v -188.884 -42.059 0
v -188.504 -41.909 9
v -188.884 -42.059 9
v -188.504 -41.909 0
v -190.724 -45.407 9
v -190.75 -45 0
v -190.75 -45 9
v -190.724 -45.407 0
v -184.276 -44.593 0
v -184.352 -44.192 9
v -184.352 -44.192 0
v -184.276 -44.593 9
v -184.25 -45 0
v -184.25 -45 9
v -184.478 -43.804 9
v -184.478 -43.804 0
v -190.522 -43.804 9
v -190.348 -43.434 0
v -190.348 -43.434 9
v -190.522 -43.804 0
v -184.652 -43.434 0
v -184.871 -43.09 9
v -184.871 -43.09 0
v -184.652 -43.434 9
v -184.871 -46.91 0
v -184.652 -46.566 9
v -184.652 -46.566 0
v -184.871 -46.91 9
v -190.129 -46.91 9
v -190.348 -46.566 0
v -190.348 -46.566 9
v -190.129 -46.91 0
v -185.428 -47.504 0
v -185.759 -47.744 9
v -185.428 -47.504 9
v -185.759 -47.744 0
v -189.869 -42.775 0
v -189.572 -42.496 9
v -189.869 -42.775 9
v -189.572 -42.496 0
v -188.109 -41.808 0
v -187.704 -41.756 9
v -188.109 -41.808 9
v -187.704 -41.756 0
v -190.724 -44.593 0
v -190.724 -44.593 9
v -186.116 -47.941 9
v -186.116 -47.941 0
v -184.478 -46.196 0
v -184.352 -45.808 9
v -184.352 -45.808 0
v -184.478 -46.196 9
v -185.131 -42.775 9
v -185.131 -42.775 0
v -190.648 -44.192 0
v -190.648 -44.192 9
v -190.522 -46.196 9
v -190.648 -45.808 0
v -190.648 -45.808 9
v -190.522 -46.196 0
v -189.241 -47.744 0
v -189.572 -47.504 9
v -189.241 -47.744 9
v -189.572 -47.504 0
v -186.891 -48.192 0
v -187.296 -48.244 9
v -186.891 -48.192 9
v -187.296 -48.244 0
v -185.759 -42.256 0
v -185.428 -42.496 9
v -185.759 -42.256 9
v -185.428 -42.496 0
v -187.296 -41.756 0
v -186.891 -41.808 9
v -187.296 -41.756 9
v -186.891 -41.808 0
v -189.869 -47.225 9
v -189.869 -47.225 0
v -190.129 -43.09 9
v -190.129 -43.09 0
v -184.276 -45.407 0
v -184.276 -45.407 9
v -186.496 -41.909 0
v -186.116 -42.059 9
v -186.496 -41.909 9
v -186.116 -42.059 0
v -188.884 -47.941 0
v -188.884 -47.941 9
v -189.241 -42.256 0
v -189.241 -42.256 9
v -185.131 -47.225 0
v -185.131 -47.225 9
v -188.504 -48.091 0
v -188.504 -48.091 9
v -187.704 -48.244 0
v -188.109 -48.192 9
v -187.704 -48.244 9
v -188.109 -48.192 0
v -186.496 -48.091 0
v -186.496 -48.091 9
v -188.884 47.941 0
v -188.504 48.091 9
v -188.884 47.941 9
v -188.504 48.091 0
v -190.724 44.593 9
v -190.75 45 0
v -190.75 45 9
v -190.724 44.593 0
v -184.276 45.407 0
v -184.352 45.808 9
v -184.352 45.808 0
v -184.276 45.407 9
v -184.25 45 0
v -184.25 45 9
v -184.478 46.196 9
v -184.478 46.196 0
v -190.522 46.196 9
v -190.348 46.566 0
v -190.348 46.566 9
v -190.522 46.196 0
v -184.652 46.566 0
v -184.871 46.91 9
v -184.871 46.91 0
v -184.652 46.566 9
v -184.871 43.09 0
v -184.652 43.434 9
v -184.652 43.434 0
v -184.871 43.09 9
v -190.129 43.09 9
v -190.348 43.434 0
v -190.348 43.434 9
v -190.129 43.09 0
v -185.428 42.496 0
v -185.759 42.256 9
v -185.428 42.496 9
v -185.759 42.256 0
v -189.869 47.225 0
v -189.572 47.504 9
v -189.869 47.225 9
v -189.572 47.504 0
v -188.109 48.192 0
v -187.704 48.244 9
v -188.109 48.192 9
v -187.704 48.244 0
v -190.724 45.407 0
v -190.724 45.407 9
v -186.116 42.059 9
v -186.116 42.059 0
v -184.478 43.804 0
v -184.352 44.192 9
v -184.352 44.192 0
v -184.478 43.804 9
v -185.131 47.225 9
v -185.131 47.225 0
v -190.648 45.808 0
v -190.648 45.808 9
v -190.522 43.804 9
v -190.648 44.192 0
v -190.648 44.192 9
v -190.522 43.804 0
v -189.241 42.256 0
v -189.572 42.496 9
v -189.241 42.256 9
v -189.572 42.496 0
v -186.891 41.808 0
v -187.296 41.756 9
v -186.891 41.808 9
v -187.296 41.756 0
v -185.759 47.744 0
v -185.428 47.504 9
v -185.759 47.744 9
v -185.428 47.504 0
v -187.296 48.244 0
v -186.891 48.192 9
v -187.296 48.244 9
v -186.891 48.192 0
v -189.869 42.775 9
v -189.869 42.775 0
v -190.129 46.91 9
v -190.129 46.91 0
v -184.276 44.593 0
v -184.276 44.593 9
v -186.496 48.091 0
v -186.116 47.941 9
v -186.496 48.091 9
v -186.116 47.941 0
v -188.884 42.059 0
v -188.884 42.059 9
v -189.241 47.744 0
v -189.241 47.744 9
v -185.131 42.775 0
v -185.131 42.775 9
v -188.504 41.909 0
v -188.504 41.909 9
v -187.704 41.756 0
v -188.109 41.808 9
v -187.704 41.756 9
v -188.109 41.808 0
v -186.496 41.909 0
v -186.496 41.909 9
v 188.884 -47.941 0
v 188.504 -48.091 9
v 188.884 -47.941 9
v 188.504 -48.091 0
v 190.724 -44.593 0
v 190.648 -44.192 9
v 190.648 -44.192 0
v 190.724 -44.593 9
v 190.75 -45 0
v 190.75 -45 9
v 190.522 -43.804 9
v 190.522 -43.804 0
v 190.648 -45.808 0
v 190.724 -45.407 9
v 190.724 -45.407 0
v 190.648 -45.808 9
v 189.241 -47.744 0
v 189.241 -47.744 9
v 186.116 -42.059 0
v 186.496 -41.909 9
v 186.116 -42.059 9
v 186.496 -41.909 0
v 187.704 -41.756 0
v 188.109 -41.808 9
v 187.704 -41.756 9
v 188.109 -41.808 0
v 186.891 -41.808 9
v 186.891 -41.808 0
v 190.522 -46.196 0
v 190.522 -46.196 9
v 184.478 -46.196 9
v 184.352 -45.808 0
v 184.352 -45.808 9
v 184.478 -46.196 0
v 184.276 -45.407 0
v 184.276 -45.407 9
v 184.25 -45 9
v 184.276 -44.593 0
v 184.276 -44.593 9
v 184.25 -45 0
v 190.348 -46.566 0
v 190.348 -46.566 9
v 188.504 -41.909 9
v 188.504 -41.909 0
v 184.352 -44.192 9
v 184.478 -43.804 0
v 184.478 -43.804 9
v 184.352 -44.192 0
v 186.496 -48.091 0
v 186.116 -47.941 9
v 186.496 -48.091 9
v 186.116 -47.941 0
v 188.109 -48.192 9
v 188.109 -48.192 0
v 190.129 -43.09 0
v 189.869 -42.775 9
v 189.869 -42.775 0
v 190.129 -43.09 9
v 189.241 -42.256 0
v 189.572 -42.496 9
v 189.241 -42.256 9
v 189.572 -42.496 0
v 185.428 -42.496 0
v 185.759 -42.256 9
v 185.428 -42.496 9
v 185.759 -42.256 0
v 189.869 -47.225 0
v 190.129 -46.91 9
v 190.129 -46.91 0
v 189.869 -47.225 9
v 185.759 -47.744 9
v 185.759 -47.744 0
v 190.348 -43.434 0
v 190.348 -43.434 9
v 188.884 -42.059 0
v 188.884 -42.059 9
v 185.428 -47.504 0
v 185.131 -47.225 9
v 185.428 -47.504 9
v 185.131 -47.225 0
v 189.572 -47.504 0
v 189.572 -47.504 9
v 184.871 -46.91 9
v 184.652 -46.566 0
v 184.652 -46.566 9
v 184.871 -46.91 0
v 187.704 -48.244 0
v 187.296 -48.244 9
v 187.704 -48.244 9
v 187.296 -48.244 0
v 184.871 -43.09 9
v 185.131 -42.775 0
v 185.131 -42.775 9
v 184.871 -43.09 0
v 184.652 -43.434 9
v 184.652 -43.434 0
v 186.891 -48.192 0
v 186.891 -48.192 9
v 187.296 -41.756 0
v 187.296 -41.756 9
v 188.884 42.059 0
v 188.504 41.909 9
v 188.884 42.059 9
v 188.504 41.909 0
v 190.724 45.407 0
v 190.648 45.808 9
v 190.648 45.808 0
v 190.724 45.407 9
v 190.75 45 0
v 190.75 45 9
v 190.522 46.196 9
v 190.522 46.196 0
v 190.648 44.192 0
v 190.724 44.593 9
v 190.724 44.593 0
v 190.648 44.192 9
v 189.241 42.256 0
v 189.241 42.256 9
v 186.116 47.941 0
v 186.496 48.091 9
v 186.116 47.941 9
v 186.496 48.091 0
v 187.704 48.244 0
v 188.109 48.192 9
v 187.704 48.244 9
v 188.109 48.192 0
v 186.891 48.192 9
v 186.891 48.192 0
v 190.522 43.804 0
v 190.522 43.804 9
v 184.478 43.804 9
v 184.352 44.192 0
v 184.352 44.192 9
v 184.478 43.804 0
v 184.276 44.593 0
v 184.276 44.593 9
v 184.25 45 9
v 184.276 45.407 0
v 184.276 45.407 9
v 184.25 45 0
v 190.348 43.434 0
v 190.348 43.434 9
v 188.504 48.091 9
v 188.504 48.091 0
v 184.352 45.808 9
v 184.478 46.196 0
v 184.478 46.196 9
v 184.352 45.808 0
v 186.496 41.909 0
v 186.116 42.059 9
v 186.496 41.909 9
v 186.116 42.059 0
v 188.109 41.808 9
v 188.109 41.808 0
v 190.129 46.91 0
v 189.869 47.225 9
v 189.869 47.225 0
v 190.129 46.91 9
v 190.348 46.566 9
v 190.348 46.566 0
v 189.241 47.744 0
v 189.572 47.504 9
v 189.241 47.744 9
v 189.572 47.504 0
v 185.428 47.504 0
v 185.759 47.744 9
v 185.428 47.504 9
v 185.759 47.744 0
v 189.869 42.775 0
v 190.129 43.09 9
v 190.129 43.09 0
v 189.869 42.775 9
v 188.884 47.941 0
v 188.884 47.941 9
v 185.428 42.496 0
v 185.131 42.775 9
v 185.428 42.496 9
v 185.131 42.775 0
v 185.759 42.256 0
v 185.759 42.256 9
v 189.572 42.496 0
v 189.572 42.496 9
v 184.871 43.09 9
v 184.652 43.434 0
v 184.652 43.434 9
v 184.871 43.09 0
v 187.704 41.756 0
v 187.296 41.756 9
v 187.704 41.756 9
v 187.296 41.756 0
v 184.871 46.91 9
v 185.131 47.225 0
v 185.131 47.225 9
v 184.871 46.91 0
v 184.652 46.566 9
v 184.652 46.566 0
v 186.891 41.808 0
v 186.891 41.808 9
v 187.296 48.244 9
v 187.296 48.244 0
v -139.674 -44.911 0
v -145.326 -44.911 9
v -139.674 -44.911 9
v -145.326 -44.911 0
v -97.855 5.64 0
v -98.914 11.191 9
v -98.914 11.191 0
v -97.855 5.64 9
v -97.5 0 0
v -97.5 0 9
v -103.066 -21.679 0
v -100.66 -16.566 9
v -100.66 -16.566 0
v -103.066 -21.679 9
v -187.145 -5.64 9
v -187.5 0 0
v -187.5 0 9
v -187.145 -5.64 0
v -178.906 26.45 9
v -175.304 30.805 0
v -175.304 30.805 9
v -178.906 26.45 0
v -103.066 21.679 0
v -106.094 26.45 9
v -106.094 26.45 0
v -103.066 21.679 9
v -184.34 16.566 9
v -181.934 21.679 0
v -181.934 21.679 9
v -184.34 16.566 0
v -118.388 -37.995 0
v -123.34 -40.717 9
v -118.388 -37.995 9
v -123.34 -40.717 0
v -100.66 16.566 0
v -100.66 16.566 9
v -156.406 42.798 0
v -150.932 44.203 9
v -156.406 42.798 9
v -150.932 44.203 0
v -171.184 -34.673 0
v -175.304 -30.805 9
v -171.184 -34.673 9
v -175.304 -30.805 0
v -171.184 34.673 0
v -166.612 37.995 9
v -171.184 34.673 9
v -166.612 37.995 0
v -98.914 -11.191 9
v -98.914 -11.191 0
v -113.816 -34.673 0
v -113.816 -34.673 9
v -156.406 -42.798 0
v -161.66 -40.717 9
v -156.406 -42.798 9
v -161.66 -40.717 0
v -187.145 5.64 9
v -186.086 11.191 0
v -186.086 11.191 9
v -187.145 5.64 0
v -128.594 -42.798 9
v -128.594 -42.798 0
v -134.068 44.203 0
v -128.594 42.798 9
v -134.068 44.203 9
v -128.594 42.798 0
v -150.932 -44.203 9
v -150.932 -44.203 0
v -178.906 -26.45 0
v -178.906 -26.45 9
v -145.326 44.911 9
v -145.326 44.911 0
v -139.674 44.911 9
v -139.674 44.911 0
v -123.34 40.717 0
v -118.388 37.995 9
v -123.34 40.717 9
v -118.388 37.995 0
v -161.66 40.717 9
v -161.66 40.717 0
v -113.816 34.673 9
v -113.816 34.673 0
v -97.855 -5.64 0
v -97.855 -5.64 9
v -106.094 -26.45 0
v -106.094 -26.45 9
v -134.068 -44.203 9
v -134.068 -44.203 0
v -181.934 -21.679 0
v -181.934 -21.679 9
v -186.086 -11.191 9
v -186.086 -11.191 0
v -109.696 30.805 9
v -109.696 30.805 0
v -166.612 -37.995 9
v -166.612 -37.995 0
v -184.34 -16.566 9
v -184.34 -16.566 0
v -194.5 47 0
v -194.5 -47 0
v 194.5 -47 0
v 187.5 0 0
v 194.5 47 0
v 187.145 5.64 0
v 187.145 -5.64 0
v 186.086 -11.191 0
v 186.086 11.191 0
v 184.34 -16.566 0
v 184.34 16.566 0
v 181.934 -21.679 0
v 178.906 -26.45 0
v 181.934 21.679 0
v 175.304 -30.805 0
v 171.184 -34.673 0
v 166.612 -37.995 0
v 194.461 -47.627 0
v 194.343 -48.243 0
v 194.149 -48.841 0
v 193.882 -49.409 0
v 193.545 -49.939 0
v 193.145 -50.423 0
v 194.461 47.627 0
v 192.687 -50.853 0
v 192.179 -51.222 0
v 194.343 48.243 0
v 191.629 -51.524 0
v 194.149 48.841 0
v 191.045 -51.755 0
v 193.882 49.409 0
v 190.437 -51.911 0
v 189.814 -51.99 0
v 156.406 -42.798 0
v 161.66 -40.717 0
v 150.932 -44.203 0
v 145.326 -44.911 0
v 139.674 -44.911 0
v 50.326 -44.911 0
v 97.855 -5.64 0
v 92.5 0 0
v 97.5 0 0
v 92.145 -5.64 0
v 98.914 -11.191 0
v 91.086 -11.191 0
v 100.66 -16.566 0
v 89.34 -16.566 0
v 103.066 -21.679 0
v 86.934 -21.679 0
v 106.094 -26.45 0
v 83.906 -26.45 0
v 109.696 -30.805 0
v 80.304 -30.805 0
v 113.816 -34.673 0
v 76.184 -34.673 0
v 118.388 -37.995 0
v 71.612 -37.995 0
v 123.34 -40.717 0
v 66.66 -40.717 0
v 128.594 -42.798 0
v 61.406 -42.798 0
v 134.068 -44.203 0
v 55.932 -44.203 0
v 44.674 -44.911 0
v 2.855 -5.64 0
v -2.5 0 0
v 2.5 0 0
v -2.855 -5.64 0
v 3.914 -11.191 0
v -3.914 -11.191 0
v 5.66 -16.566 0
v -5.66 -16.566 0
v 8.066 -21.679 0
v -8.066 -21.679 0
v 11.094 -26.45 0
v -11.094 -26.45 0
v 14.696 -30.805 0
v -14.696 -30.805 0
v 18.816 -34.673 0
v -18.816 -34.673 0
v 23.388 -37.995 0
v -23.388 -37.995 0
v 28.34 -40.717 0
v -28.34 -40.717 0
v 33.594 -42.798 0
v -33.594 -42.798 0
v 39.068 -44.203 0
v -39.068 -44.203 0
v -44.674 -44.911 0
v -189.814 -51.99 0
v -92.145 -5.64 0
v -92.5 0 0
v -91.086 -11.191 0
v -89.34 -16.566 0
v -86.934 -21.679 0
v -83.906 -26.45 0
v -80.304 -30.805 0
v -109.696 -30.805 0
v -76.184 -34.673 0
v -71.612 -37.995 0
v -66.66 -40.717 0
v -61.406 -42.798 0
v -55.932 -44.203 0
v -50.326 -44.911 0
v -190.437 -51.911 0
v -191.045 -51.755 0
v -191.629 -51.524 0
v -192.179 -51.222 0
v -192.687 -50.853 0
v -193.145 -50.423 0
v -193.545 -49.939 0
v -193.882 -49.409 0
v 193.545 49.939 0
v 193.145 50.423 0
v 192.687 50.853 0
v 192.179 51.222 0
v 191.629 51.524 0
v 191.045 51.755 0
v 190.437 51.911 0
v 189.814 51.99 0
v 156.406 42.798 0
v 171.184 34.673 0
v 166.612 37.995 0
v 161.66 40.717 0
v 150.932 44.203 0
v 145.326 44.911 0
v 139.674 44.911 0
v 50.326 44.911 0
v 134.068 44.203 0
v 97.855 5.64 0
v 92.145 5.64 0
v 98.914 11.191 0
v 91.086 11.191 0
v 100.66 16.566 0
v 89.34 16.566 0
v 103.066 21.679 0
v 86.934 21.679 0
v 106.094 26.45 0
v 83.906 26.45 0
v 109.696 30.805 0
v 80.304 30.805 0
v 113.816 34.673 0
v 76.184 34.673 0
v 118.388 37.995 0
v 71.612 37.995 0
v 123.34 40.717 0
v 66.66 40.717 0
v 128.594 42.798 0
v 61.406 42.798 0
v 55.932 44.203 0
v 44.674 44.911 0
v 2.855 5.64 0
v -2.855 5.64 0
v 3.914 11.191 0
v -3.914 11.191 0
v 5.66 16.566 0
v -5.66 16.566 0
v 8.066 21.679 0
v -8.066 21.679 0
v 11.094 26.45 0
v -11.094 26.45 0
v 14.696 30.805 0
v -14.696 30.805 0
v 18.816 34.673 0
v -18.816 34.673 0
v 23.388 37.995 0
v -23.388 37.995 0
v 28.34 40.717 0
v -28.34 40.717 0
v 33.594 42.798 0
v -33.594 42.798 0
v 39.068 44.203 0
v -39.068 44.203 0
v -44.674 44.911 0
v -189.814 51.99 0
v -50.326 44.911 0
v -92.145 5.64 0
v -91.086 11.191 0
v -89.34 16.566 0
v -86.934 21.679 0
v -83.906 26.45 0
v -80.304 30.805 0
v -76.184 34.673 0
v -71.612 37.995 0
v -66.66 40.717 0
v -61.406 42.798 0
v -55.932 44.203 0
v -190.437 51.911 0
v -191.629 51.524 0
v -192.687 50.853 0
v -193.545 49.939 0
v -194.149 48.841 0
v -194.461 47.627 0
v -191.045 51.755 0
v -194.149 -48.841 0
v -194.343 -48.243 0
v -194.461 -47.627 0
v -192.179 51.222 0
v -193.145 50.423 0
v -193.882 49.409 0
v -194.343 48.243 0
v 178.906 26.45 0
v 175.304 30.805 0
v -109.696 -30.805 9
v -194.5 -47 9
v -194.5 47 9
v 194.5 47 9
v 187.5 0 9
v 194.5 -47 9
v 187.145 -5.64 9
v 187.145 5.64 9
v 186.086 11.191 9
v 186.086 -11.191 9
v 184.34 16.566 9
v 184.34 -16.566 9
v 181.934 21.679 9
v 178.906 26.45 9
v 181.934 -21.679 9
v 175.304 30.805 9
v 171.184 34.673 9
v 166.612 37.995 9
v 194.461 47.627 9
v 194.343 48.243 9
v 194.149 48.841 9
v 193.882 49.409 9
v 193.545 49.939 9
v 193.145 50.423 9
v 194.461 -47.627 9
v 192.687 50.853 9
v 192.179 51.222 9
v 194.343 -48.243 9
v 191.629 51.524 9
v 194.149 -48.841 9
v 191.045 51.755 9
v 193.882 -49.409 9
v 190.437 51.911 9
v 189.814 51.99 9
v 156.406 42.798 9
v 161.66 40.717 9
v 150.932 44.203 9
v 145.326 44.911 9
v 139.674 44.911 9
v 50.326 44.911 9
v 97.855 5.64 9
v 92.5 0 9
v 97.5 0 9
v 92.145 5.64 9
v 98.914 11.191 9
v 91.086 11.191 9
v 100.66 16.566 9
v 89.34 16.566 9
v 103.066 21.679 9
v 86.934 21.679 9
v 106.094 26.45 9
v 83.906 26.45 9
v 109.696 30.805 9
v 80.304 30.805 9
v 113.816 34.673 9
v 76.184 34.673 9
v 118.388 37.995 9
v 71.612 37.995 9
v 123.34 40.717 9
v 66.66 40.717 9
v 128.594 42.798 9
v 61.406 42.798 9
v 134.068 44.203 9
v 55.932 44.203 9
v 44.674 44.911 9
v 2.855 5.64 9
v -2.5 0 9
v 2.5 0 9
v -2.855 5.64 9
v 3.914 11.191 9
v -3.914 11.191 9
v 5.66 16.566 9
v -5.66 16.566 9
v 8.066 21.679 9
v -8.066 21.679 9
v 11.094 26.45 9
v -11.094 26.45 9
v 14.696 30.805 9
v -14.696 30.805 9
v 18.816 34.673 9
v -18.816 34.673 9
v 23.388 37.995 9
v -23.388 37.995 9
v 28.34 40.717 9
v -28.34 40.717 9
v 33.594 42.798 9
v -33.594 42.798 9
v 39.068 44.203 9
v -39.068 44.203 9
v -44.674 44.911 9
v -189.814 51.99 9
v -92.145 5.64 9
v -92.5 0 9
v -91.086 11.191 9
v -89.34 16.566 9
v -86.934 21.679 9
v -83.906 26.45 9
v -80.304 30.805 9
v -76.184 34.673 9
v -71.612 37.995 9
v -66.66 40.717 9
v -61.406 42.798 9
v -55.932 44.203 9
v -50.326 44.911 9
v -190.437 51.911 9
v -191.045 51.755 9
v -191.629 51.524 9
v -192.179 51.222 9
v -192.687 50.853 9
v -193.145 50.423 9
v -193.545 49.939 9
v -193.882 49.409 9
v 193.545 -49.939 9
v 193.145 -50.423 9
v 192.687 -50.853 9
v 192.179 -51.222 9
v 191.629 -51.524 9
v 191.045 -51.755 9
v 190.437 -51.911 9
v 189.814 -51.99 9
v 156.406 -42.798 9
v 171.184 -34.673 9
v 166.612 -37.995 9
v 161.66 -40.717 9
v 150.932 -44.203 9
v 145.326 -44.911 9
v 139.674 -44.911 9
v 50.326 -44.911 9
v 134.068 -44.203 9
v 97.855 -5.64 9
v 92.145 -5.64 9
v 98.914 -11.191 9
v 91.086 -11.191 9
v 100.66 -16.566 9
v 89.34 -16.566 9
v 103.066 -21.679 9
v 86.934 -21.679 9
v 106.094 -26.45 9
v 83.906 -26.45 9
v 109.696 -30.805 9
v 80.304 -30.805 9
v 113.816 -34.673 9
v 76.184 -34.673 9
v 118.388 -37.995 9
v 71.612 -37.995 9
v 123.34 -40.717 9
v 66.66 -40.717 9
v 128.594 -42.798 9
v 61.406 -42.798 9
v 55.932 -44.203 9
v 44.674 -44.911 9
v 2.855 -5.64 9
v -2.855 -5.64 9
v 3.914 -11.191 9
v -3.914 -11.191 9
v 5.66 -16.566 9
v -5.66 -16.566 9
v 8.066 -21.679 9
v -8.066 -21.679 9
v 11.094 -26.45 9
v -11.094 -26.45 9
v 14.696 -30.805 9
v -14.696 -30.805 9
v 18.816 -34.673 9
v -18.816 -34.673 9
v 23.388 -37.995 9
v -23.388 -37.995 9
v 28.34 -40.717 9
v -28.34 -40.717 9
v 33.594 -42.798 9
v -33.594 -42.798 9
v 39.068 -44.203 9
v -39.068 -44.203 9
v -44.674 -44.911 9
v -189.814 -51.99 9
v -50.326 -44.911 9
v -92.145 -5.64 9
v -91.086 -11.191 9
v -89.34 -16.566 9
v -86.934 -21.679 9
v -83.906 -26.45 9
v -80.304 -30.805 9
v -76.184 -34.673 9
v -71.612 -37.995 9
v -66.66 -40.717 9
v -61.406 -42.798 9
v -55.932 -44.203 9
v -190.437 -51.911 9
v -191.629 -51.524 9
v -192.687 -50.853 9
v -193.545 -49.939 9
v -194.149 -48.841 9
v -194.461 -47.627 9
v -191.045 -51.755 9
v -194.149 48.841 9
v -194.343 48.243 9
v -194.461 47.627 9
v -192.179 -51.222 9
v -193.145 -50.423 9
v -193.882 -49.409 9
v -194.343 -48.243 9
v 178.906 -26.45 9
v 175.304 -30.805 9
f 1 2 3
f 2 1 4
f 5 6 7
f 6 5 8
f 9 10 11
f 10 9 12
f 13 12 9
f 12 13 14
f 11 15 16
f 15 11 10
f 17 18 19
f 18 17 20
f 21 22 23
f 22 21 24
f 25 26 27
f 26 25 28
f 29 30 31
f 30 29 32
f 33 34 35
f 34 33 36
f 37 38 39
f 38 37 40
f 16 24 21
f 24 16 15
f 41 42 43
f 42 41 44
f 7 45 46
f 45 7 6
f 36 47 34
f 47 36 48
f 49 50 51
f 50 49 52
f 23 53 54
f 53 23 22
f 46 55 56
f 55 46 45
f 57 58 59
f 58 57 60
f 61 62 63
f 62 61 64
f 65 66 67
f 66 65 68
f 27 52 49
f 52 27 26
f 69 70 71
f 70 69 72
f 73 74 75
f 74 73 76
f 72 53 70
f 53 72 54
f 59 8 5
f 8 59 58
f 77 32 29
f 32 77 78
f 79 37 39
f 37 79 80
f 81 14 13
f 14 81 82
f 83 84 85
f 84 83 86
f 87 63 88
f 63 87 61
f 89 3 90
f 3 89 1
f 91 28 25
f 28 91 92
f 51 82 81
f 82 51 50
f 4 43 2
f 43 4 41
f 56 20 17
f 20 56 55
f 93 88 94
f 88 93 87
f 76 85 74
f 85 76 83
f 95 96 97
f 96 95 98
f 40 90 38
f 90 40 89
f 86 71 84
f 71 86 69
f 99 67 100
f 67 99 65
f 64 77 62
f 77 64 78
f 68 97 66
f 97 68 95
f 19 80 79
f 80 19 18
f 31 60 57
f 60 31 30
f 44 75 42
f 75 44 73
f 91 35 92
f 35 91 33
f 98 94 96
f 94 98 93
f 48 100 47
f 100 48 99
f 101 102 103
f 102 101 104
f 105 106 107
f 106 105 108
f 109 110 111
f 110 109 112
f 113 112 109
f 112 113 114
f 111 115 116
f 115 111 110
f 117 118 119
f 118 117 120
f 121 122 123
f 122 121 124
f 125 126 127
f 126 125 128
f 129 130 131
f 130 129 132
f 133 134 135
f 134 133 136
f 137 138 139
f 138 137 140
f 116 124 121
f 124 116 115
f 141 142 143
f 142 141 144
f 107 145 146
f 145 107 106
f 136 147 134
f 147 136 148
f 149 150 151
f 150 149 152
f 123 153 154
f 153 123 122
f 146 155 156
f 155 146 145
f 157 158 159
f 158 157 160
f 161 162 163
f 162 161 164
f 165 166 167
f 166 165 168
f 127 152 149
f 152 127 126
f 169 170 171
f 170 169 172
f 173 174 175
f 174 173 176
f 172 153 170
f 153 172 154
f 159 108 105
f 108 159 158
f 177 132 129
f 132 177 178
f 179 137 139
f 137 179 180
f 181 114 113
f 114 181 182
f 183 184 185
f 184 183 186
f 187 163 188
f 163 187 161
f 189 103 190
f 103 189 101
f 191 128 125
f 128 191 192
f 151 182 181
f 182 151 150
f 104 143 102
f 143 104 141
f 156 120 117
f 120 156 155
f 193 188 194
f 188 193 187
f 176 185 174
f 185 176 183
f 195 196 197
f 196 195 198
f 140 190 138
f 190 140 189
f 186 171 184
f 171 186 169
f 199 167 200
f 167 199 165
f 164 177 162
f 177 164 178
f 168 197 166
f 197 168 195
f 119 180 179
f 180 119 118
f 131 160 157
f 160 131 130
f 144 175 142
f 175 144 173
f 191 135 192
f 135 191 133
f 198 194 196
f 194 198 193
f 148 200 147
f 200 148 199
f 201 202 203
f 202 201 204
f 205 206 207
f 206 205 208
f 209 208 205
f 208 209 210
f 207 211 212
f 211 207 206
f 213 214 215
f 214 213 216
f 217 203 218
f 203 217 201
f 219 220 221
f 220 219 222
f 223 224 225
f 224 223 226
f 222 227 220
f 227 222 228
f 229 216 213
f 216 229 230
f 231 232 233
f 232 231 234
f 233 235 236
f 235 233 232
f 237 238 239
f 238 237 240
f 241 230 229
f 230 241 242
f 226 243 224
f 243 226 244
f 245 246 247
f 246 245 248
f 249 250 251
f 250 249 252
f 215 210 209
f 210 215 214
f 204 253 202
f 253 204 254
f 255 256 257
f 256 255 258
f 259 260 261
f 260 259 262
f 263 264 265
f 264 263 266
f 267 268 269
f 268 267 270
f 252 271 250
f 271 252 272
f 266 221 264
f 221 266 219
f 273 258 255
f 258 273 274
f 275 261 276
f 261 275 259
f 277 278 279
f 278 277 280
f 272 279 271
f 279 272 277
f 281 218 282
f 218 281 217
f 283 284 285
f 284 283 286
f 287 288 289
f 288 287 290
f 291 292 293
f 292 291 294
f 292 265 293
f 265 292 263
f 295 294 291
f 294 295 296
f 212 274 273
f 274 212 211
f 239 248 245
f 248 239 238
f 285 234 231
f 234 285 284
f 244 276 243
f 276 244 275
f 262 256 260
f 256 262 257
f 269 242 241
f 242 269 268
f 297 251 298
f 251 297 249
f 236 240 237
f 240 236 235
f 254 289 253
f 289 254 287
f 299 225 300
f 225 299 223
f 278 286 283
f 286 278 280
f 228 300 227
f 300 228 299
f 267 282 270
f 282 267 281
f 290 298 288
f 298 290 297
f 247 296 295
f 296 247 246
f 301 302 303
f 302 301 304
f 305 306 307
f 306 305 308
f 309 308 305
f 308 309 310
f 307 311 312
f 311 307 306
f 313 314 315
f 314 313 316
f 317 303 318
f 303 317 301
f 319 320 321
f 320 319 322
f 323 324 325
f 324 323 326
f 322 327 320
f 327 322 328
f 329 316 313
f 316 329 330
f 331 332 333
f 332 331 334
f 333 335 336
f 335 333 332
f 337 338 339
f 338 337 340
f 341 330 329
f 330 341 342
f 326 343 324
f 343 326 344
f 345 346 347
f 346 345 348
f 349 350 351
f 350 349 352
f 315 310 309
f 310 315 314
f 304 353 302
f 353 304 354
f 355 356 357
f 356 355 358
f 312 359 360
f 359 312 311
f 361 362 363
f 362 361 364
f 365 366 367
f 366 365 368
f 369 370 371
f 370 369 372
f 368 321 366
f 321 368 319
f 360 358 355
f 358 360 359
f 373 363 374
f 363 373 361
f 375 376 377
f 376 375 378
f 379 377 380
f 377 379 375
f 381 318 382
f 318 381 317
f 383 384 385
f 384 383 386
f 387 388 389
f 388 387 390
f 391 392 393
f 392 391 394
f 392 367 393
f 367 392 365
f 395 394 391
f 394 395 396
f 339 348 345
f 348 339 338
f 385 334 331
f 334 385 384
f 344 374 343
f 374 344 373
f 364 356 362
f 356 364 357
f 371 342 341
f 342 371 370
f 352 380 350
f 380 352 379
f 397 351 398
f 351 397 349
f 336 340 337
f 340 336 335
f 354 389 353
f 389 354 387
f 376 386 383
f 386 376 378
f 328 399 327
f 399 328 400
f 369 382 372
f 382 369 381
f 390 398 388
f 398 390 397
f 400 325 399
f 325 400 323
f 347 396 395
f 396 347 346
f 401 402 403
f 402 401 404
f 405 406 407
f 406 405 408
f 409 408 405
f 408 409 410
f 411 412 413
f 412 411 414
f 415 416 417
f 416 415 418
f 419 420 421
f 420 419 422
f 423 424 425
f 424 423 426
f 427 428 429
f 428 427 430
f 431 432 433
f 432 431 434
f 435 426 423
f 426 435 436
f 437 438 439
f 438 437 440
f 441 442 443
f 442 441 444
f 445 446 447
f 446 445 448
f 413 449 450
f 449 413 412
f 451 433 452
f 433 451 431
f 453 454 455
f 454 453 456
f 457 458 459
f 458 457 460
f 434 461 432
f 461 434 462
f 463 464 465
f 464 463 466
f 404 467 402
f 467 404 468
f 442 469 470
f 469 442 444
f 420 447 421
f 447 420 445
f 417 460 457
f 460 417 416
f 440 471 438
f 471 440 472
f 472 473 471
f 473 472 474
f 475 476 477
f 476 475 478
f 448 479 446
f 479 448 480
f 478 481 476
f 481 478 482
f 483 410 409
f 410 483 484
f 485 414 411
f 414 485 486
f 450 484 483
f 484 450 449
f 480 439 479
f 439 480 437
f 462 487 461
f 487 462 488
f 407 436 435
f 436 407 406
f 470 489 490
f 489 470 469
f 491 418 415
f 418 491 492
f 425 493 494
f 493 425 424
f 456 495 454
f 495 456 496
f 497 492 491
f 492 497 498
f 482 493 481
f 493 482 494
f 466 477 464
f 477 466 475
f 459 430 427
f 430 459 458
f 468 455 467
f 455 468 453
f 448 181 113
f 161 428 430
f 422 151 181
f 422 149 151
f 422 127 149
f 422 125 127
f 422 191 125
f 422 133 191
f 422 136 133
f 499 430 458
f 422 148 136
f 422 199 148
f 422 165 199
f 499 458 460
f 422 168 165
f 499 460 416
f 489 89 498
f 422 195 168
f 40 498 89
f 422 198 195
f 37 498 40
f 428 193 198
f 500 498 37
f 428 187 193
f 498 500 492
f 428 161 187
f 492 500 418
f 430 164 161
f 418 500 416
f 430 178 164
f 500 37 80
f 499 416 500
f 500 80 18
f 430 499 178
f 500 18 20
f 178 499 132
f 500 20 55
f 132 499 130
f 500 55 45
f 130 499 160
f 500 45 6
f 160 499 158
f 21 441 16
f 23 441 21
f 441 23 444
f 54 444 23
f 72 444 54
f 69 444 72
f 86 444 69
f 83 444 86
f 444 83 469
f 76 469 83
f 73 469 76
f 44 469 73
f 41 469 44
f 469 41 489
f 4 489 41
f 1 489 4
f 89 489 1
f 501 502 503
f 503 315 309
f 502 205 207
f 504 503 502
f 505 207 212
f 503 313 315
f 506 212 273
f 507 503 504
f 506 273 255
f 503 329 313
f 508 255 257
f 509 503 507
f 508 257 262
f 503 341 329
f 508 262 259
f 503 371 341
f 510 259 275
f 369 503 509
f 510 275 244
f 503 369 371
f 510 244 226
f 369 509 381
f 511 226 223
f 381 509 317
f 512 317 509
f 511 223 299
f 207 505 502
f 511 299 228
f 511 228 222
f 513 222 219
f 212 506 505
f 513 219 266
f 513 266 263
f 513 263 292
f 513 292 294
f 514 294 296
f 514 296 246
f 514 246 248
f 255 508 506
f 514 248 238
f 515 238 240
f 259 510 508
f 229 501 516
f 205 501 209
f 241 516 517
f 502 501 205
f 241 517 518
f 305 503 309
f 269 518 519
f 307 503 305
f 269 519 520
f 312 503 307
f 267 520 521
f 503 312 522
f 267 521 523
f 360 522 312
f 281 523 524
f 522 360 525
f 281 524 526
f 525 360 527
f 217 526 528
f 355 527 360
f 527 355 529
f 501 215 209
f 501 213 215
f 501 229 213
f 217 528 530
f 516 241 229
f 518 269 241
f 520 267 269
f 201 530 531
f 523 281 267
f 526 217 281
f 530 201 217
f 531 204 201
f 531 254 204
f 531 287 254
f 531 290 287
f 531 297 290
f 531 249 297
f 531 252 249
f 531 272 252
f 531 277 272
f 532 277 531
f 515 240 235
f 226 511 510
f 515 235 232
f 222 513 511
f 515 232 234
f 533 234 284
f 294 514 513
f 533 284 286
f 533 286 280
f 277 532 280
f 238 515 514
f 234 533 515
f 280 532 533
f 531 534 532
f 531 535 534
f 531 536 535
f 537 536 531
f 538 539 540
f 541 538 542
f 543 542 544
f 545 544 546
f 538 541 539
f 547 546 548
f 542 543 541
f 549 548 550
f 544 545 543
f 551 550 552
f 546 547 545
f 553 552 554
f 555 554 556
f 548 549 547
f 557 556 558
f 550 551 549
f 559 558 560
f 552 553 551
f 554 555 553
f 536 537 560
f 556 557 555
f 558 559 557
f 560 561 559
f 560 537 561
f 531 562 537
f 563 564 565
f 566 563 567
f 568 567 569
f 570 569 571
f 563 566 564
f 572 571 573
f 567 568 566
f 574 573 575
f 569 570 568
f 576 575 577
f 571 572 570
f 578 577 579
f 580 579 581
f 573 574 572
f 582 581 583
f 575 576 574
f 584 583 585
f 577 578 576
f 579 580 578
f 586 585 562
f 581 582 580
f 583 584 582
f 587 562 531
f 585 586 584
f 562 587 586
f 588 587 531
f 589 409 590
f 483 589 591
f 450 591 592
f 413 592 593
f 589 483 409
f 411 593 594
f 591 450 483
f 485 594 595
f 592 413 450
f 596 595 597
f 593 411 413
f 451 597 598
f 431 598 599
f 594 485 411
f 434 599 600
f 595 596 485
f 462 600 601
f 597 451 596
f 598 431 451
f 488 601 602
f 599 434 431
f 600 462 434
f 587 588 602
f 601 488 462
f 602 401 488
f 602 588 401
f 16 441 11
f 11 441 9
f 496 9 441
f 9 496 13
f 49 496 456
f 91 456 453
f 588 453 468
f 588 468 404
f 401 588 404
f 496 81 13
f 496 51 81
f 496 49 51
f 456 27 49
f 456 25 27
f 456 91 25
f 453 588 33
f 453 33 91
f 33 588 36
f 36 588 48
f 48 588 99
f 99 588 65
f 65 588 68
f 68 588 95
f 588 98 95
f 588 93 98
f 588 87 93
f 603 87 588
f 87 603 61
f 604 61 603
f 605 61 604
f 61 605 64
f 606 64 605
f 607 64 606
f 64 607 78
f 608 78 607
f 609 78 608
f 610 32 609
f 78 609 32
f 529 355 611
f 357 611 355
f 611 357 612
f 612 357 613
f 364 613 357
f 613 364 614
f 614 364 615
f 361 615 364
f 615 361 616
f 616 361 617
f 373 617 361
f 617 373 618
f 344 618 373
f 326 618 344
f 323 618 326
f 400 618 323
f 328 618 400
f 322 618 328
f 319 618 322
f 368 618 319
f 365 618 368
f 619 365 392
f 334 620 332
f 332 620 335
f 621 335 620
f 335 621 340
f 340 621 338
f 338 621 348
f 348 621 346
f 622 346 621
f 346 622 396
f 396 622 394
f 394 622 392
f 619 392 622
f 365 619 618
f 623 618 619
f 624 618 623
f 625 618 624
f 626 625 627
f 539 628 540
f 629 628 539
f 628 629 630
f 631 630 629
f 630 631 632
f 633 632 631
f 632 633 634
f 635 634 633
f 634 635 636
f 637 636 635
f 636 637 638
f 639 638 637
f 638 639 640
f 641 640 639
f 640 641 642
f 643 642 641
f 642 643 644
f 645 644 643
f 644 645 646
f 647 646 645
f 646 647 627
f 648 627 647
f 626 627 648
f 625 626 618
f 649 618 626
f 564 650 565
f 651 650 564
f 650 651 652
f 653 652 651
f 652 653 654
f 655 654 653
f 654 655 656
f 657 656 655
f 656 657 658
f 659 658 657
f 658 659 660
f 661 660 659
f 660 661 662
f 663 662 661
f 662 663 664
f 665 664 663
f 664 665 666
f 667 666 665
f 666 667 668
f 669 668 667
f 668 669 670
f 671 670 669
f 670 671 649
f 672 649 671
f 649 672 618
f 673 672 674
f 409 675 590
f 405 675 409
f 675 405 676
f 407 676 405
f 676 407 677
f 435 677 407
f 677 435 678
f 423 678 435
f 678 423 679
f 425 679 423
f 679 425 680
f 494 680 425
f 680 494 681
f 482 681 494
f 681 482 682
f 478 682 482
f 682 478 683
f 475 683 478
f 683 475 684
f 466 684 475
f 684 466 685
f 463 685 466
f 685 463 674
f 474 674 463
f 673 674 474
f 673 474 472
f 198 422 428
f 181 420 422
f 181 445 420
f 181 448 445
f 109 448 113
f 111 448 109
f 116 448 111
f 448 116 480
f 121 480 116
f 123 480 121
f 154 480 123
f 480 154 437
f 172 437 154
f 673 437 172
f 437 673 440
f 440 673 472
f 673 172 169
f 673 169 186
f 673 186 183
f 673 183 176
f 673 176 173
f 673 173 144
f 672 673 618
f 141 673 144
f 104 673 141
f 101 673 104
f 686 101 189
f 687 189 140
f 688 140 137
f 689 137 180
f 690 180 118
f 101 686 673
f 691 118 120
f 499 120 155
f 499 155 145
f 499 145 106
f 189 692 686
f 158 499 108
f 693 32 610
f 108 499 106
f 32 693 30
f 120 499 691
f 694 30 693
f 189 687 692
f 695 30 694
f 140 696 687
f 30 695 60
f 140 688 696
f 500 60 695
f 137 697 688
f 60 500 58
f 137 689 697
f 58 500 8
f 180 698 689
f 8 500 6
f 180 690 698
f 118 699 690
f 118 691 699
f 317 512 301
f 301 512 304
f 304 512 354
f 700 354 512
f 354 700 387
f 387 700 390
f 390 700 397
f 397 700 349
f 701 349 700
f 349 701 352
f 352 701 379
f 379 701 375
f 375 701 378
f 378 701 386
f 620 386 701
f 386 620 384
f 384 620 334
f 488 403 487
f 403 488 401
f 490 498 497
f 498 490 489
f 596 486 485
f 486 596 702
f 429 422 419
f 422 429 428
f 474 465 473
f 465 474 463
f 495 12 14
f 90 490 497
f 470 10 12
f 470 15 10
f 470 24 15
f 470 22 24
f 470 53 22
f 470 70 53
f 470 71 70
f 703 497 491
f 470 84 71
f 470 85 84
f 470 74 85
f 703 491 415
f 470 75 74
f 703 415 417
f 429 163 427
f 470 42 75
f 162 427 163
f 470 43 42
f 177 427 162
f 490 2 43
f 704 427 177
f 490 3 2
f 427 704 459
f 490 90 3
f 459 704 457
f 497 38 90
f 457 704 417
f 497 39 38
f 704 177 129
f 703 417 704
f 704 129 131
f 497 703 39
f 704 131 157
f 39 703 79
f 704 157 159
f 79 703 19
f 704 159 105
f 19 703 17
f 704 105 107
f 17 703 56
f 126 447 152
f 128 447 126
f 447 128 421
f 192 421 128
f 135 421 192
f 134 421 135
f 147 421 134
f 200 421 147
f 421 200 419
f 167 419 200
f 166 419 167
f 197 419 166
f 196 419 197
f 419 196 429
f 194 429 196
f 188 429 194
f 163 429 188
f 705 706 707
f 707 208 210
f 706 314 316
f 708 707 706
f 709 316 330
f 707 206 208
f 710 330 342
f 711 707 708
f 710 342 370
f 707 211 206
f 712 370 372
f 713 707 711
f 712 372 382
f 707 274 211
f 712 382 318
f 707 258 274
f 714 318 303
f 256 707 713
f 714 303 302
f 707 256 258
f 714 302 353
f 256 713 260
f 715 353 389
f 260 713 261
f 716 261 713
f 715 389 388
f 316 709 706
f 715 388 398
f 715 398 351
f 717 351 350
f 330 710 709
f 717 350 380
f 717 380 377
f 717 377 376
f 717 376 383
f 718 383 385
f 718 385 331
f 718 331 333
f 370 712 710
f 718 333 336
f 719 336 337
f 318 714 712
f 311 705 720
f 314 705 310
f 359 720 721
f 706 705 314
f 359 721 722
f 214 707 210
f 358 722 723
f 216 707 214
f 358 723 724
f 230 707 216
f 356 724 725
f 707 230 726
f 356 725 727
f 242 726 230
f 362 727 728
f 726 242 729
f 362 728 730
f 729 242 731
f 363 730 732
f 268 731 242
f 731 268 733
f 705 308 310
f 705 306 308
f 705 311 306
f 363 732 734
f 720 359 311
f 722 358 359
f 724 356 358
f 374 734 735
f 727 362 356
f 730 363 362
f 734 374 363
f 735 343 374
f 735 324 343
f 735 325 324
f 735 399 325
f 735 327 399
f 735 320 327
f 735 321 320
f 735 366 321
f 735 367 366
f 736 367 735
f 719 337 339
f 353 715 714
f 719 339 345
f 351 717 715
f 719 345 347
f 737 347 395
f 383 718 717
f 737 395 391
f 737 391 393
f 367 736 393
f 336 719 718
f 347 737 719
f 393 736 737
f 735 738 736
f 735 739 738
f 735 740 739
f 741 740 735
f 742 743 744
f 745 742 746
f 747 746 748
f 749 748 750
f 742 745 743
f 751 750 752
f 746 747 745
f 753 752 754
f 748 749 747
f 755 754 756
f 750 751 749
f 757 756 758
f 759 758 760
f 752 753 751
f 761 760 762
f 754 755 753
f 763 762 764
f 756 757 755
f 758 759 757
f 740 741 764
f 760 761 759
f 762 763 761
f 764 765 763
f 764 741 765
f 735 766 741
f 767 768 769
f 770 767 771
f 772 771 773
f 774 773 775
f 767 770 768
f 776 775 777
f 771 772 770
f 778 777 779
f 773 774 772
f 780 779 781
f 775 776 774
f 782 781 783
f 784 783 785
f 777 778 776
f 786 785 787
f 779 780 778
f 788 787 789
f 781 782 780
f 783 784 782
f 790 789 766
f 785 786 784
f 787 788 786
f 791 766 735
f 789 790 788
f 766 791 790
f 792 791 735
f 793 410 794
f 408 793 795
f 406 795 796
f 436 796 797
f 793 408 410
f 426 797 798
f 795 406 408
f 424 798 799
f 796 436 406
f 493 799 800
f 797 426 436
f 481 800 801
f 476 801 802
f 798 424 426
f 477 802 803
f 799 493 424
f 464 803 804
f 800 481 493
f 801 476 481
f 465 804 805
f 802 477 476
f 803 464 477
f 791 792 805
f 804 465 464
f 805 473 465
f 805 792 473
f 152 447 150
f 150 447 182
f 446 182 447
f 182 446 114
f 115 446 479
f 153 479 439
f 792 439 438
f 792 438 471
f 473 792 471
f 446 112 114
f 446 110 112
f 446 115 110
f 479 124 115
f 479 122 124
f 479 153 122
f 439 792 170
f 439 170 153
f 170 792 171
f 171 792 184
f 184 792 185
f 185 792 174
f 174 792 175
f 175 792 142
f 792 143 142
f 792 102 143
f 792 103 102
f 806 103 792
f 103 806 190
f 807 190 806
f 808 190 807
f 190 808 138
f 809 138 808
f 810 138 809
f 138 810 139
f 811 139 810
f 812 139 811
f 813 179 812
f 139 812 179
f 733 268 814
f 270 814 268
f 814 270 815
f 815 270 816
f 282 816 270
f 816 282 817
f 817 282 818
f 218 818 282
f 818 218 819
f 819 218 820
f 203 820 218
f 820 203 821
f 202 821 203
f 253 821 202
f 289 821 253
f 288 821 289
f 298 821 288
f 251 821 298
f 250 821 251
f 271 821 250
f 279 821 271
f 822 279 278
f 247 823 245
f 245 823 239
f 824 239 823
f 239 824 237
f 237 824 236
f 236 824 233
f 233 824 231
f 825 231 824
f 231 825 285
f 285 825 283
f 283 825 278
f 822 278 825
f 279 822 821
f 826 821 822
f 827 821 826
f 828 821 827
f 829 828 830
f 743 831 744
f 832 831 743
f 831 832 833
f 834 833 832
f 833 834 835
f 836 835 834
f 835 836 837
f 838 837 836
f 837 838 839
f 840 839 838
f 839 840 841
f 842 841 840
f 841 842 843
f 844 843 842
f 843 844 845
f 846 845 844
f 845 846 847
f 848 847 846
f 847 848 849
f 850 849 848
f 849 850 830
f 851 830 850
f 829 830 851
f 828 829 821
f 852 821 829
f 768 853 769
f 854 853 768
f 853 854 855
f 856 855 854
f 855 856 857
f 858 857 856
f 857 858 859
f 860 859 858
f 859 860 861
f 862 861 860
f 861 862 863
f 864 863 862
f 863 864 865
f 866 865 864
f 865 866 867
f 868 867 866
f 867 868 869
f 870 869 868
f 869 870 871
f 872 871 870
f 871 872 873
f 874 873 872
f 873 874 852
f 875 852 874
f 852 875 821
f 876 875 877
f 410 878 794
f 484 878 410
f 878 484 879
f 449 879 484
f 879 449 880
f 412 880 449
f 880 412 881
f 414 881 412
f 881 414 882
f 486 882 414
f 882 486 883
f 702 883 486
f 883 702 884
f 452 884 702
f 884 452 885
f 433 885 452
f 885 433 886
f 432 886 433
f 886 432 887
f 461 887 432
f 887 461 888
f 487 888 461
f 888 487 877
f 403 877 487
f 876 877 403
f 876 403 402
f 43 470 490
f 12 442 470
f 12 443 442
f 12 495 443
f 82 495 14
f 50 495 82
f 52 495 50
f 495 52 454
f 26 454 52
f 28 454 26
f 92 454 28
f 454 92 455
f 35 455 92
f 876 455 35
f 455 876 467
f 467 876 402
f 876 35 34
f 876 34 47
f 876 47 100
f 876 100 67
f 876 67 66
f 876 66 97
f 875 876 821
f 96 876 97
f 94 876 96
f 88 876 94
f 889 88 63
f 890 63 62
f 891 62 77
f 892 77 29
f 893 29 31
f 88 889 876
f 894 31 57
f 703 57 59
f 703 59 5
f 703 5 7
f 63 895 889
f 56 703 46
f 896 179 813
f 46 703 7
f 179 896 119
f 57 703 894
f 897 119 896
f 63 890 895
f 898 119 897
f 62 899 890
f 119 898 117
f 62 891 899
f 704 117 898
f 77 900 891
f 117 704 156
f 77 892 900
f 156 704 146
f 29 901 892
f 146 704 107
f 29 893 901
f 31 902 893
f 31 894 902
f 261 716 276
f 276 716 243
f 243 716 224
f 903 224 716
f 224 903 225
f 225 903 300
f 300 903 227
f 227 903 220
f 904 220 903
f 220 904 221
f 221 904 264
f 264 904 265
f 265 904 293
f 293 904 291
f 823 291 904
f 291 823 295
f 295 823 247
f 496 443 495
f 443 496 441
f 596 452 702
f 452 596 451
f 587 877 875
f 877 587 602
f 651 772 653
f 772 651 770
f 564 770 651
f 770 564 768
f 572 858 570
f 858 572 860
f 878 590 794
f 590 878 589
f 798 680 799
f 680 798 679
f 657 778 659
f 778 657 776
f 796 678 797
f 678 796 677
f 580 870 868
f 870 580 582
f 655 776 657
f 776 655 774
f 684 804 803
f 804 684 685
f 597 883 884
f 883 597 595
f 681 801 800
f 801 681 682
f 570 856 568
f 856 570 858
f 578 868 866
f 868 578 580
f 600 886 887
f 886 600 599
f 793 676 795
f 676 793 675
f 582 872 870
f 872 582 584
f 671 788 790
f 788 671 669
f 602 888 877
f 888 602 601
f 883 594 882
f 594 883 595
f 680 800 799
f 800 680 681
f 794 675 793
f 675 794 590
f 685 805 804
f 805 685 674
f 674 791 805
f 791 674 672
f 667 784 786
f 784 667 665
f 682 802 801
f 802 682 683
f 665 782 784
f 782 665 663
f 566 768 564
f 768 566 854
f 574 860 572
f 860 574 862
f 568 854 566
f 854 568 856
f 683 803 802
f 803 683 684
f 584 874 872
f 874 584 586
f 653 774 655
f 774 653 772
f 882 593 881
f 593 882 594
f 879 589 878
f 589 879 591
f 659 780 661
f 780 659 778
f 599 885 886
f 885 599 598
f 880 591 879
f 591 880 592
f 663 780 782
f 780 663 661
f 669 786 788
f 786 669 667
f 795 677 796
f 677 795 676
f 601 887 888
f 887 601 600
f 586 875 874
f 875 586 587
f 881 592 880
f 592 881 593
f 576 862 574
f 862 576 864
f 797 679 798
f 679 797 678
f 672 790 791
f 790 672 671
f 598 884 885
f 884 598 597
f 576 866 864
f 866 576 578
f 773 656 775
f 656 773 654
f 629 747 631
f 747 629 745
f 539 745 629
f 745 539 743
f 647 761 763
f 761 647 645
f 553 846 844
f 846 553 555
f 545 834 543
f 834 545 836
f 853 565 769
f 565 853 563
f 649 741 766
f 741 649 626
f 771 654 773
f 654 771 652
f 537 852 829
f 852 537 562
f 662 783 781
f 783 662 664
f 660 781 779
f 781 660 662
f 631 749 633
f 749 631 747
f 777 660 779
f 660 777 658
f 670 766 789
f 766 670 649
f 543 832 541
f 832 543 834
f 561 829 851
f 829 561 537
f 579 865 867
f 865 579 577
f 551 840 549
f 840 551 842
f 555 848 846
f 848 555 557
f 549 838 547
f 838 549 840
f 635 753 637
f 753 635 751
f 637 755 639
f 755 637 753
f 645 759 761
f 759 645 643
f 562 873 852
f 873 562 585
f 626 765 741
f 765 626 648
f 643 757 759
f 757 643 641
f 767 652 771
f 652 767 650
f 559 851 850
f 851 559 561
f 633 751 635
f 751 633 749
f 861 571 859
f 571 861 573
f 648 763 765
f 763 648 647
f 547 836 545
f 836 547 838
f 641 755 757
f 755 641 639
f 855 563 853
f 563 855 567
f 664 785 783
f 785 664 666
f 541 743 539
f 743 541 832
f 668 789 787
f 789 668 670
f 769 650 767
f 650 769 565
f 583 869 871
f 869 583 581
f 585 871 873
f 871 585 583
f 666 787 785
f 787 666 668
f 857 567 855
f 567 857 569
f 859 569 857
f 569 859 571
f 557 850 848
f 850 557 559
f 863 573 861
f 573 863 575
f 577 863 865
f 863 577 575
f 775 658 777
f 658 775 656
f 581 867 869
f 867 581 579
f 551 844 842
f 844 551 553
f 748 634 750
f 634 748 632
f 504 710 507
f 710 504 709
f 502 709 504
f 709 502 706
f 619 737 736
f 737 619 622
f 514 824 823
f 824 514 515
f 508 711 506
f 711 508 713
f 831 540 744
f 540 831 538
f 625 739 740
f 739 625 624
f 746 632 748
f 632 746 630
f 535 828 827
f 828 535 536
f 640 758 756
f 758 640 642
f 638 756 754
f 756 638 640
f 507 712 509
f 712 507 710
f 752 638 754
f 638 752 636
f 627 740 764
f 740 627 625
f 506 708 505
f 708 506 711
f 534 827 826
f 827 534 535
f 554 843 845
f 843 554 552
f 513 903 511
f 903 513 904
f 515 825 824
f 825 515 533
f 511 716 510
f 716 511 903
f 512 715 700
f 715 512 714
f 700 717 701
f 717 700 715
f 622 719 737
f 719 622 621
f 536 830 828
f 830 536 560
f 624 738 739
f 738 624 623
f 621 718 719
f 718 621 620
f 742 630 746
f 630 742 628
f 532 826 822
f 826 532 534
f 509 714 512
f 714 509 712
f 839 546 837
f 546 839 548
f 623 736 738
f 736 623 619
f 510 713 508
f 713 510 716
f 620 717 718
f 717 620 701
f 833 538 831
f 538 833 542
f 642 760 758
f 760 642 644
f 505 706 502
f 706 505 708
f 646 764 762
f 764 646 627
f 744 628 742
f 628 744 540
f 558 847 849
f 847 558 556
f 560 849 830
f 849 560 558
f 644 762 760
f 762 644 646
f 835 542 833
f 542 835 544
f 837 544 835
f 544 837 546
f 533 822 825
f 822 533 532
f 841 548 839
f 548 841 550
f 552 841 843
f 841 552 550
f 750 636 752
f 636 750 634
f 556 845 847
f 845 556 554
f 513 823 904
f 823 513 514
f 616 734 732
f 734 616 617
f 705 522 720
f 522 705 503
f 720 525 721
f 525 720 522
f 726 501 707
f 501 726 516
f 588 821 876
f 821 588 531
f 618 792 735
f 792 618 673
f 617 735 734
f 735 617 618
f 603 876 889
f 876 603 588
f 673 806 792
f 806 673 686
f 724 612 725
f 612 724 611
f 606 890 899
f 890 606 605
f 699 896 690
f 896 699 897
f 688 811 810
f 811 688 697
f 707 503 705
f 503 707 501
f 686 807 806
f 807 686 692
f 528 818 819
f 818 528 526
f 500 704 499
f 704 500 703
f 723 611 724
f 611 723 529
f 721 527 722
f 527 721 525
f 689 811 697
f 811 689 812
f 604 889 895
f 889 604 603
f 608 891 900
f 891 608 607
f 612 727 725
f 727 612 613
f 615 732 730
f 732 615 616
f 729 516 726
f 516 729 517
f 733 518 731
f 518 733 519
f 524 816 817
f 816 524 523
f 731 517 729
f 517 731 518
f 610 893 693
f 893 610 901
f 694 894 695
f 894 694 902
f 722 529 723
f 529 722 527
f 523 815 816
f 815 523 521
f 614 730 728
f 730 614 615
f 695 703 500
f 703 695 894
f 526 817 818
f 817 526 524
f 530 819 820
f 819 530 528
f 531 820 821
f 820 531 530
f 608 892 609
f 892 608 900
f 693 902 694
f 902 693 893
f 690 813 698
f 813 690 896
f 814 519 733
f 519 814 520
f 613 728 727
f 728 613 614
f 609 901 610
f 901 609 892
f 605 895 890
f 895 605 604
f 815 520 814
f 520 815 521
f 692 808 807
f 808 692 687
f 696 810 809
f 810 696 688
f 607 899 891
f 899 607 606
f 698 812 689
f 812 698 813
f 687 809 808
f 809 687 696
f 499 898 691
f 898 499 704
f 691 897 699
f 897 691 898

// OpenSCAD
$fn = 50;


difference() {
	union() {
		hull() {
			translate(v = [-189.5000000000, 47.0000000000, 0]) {
				cylinder(h = 9, r = 5);
			}
			translate(v = [189.5000000000, 47.0000000000, 0]) {
				cylinder(h = 9, r = 5);
			}
			translate(v = [-189.5000000000, -47.0000000000, 0]) {
				cylinder(h = 9, r = 5);
			}
			translate(v = [189.5000000000, -47.0000000000, 0]) {
				cylinder(h = 9, r = 5);
			}
		}
	}
	union() {
		#translate(v = [-187.5000000000, -45.0000000000, -100.0000000000]) {
			cylinder(h = 200, r = 3.2500000000);
		}
		#translate(v = [-187.5000000000, 45.0000000000, -100.0000000000]) {
			cylinder(h = 200, r = 3.2500000000);
		}
		#translate(v = [187.5000000000, -45.0000000000, -100.0000000000]) {
			cylinder(h = 200, r = 3.2500000000);
		}
		#translate(v = [187.5000000000, 45.0000000000, -100.0000000000]) {
			cylinder(h = 200, r = 3.2500000000);
		}
		#translate(v = [-142.5000000000, 0, 0]) {
			cylinder(h = 9, r = 45.0000000000);
		}
		#translate(v = [-47.5000000000, 0, 0]) {
			cylinder(h = 9, r = 45.0000000000);
		}
		#translate(v = [47.5000000000, 0, 0]) {
			cylinder(h = 9, r = 45.0000000000);
		}
		#translate(v = [142.5000000000, 0, 0]) {
			cylinder(h = 9, r = 45.0000000000);
		}
	}
}
